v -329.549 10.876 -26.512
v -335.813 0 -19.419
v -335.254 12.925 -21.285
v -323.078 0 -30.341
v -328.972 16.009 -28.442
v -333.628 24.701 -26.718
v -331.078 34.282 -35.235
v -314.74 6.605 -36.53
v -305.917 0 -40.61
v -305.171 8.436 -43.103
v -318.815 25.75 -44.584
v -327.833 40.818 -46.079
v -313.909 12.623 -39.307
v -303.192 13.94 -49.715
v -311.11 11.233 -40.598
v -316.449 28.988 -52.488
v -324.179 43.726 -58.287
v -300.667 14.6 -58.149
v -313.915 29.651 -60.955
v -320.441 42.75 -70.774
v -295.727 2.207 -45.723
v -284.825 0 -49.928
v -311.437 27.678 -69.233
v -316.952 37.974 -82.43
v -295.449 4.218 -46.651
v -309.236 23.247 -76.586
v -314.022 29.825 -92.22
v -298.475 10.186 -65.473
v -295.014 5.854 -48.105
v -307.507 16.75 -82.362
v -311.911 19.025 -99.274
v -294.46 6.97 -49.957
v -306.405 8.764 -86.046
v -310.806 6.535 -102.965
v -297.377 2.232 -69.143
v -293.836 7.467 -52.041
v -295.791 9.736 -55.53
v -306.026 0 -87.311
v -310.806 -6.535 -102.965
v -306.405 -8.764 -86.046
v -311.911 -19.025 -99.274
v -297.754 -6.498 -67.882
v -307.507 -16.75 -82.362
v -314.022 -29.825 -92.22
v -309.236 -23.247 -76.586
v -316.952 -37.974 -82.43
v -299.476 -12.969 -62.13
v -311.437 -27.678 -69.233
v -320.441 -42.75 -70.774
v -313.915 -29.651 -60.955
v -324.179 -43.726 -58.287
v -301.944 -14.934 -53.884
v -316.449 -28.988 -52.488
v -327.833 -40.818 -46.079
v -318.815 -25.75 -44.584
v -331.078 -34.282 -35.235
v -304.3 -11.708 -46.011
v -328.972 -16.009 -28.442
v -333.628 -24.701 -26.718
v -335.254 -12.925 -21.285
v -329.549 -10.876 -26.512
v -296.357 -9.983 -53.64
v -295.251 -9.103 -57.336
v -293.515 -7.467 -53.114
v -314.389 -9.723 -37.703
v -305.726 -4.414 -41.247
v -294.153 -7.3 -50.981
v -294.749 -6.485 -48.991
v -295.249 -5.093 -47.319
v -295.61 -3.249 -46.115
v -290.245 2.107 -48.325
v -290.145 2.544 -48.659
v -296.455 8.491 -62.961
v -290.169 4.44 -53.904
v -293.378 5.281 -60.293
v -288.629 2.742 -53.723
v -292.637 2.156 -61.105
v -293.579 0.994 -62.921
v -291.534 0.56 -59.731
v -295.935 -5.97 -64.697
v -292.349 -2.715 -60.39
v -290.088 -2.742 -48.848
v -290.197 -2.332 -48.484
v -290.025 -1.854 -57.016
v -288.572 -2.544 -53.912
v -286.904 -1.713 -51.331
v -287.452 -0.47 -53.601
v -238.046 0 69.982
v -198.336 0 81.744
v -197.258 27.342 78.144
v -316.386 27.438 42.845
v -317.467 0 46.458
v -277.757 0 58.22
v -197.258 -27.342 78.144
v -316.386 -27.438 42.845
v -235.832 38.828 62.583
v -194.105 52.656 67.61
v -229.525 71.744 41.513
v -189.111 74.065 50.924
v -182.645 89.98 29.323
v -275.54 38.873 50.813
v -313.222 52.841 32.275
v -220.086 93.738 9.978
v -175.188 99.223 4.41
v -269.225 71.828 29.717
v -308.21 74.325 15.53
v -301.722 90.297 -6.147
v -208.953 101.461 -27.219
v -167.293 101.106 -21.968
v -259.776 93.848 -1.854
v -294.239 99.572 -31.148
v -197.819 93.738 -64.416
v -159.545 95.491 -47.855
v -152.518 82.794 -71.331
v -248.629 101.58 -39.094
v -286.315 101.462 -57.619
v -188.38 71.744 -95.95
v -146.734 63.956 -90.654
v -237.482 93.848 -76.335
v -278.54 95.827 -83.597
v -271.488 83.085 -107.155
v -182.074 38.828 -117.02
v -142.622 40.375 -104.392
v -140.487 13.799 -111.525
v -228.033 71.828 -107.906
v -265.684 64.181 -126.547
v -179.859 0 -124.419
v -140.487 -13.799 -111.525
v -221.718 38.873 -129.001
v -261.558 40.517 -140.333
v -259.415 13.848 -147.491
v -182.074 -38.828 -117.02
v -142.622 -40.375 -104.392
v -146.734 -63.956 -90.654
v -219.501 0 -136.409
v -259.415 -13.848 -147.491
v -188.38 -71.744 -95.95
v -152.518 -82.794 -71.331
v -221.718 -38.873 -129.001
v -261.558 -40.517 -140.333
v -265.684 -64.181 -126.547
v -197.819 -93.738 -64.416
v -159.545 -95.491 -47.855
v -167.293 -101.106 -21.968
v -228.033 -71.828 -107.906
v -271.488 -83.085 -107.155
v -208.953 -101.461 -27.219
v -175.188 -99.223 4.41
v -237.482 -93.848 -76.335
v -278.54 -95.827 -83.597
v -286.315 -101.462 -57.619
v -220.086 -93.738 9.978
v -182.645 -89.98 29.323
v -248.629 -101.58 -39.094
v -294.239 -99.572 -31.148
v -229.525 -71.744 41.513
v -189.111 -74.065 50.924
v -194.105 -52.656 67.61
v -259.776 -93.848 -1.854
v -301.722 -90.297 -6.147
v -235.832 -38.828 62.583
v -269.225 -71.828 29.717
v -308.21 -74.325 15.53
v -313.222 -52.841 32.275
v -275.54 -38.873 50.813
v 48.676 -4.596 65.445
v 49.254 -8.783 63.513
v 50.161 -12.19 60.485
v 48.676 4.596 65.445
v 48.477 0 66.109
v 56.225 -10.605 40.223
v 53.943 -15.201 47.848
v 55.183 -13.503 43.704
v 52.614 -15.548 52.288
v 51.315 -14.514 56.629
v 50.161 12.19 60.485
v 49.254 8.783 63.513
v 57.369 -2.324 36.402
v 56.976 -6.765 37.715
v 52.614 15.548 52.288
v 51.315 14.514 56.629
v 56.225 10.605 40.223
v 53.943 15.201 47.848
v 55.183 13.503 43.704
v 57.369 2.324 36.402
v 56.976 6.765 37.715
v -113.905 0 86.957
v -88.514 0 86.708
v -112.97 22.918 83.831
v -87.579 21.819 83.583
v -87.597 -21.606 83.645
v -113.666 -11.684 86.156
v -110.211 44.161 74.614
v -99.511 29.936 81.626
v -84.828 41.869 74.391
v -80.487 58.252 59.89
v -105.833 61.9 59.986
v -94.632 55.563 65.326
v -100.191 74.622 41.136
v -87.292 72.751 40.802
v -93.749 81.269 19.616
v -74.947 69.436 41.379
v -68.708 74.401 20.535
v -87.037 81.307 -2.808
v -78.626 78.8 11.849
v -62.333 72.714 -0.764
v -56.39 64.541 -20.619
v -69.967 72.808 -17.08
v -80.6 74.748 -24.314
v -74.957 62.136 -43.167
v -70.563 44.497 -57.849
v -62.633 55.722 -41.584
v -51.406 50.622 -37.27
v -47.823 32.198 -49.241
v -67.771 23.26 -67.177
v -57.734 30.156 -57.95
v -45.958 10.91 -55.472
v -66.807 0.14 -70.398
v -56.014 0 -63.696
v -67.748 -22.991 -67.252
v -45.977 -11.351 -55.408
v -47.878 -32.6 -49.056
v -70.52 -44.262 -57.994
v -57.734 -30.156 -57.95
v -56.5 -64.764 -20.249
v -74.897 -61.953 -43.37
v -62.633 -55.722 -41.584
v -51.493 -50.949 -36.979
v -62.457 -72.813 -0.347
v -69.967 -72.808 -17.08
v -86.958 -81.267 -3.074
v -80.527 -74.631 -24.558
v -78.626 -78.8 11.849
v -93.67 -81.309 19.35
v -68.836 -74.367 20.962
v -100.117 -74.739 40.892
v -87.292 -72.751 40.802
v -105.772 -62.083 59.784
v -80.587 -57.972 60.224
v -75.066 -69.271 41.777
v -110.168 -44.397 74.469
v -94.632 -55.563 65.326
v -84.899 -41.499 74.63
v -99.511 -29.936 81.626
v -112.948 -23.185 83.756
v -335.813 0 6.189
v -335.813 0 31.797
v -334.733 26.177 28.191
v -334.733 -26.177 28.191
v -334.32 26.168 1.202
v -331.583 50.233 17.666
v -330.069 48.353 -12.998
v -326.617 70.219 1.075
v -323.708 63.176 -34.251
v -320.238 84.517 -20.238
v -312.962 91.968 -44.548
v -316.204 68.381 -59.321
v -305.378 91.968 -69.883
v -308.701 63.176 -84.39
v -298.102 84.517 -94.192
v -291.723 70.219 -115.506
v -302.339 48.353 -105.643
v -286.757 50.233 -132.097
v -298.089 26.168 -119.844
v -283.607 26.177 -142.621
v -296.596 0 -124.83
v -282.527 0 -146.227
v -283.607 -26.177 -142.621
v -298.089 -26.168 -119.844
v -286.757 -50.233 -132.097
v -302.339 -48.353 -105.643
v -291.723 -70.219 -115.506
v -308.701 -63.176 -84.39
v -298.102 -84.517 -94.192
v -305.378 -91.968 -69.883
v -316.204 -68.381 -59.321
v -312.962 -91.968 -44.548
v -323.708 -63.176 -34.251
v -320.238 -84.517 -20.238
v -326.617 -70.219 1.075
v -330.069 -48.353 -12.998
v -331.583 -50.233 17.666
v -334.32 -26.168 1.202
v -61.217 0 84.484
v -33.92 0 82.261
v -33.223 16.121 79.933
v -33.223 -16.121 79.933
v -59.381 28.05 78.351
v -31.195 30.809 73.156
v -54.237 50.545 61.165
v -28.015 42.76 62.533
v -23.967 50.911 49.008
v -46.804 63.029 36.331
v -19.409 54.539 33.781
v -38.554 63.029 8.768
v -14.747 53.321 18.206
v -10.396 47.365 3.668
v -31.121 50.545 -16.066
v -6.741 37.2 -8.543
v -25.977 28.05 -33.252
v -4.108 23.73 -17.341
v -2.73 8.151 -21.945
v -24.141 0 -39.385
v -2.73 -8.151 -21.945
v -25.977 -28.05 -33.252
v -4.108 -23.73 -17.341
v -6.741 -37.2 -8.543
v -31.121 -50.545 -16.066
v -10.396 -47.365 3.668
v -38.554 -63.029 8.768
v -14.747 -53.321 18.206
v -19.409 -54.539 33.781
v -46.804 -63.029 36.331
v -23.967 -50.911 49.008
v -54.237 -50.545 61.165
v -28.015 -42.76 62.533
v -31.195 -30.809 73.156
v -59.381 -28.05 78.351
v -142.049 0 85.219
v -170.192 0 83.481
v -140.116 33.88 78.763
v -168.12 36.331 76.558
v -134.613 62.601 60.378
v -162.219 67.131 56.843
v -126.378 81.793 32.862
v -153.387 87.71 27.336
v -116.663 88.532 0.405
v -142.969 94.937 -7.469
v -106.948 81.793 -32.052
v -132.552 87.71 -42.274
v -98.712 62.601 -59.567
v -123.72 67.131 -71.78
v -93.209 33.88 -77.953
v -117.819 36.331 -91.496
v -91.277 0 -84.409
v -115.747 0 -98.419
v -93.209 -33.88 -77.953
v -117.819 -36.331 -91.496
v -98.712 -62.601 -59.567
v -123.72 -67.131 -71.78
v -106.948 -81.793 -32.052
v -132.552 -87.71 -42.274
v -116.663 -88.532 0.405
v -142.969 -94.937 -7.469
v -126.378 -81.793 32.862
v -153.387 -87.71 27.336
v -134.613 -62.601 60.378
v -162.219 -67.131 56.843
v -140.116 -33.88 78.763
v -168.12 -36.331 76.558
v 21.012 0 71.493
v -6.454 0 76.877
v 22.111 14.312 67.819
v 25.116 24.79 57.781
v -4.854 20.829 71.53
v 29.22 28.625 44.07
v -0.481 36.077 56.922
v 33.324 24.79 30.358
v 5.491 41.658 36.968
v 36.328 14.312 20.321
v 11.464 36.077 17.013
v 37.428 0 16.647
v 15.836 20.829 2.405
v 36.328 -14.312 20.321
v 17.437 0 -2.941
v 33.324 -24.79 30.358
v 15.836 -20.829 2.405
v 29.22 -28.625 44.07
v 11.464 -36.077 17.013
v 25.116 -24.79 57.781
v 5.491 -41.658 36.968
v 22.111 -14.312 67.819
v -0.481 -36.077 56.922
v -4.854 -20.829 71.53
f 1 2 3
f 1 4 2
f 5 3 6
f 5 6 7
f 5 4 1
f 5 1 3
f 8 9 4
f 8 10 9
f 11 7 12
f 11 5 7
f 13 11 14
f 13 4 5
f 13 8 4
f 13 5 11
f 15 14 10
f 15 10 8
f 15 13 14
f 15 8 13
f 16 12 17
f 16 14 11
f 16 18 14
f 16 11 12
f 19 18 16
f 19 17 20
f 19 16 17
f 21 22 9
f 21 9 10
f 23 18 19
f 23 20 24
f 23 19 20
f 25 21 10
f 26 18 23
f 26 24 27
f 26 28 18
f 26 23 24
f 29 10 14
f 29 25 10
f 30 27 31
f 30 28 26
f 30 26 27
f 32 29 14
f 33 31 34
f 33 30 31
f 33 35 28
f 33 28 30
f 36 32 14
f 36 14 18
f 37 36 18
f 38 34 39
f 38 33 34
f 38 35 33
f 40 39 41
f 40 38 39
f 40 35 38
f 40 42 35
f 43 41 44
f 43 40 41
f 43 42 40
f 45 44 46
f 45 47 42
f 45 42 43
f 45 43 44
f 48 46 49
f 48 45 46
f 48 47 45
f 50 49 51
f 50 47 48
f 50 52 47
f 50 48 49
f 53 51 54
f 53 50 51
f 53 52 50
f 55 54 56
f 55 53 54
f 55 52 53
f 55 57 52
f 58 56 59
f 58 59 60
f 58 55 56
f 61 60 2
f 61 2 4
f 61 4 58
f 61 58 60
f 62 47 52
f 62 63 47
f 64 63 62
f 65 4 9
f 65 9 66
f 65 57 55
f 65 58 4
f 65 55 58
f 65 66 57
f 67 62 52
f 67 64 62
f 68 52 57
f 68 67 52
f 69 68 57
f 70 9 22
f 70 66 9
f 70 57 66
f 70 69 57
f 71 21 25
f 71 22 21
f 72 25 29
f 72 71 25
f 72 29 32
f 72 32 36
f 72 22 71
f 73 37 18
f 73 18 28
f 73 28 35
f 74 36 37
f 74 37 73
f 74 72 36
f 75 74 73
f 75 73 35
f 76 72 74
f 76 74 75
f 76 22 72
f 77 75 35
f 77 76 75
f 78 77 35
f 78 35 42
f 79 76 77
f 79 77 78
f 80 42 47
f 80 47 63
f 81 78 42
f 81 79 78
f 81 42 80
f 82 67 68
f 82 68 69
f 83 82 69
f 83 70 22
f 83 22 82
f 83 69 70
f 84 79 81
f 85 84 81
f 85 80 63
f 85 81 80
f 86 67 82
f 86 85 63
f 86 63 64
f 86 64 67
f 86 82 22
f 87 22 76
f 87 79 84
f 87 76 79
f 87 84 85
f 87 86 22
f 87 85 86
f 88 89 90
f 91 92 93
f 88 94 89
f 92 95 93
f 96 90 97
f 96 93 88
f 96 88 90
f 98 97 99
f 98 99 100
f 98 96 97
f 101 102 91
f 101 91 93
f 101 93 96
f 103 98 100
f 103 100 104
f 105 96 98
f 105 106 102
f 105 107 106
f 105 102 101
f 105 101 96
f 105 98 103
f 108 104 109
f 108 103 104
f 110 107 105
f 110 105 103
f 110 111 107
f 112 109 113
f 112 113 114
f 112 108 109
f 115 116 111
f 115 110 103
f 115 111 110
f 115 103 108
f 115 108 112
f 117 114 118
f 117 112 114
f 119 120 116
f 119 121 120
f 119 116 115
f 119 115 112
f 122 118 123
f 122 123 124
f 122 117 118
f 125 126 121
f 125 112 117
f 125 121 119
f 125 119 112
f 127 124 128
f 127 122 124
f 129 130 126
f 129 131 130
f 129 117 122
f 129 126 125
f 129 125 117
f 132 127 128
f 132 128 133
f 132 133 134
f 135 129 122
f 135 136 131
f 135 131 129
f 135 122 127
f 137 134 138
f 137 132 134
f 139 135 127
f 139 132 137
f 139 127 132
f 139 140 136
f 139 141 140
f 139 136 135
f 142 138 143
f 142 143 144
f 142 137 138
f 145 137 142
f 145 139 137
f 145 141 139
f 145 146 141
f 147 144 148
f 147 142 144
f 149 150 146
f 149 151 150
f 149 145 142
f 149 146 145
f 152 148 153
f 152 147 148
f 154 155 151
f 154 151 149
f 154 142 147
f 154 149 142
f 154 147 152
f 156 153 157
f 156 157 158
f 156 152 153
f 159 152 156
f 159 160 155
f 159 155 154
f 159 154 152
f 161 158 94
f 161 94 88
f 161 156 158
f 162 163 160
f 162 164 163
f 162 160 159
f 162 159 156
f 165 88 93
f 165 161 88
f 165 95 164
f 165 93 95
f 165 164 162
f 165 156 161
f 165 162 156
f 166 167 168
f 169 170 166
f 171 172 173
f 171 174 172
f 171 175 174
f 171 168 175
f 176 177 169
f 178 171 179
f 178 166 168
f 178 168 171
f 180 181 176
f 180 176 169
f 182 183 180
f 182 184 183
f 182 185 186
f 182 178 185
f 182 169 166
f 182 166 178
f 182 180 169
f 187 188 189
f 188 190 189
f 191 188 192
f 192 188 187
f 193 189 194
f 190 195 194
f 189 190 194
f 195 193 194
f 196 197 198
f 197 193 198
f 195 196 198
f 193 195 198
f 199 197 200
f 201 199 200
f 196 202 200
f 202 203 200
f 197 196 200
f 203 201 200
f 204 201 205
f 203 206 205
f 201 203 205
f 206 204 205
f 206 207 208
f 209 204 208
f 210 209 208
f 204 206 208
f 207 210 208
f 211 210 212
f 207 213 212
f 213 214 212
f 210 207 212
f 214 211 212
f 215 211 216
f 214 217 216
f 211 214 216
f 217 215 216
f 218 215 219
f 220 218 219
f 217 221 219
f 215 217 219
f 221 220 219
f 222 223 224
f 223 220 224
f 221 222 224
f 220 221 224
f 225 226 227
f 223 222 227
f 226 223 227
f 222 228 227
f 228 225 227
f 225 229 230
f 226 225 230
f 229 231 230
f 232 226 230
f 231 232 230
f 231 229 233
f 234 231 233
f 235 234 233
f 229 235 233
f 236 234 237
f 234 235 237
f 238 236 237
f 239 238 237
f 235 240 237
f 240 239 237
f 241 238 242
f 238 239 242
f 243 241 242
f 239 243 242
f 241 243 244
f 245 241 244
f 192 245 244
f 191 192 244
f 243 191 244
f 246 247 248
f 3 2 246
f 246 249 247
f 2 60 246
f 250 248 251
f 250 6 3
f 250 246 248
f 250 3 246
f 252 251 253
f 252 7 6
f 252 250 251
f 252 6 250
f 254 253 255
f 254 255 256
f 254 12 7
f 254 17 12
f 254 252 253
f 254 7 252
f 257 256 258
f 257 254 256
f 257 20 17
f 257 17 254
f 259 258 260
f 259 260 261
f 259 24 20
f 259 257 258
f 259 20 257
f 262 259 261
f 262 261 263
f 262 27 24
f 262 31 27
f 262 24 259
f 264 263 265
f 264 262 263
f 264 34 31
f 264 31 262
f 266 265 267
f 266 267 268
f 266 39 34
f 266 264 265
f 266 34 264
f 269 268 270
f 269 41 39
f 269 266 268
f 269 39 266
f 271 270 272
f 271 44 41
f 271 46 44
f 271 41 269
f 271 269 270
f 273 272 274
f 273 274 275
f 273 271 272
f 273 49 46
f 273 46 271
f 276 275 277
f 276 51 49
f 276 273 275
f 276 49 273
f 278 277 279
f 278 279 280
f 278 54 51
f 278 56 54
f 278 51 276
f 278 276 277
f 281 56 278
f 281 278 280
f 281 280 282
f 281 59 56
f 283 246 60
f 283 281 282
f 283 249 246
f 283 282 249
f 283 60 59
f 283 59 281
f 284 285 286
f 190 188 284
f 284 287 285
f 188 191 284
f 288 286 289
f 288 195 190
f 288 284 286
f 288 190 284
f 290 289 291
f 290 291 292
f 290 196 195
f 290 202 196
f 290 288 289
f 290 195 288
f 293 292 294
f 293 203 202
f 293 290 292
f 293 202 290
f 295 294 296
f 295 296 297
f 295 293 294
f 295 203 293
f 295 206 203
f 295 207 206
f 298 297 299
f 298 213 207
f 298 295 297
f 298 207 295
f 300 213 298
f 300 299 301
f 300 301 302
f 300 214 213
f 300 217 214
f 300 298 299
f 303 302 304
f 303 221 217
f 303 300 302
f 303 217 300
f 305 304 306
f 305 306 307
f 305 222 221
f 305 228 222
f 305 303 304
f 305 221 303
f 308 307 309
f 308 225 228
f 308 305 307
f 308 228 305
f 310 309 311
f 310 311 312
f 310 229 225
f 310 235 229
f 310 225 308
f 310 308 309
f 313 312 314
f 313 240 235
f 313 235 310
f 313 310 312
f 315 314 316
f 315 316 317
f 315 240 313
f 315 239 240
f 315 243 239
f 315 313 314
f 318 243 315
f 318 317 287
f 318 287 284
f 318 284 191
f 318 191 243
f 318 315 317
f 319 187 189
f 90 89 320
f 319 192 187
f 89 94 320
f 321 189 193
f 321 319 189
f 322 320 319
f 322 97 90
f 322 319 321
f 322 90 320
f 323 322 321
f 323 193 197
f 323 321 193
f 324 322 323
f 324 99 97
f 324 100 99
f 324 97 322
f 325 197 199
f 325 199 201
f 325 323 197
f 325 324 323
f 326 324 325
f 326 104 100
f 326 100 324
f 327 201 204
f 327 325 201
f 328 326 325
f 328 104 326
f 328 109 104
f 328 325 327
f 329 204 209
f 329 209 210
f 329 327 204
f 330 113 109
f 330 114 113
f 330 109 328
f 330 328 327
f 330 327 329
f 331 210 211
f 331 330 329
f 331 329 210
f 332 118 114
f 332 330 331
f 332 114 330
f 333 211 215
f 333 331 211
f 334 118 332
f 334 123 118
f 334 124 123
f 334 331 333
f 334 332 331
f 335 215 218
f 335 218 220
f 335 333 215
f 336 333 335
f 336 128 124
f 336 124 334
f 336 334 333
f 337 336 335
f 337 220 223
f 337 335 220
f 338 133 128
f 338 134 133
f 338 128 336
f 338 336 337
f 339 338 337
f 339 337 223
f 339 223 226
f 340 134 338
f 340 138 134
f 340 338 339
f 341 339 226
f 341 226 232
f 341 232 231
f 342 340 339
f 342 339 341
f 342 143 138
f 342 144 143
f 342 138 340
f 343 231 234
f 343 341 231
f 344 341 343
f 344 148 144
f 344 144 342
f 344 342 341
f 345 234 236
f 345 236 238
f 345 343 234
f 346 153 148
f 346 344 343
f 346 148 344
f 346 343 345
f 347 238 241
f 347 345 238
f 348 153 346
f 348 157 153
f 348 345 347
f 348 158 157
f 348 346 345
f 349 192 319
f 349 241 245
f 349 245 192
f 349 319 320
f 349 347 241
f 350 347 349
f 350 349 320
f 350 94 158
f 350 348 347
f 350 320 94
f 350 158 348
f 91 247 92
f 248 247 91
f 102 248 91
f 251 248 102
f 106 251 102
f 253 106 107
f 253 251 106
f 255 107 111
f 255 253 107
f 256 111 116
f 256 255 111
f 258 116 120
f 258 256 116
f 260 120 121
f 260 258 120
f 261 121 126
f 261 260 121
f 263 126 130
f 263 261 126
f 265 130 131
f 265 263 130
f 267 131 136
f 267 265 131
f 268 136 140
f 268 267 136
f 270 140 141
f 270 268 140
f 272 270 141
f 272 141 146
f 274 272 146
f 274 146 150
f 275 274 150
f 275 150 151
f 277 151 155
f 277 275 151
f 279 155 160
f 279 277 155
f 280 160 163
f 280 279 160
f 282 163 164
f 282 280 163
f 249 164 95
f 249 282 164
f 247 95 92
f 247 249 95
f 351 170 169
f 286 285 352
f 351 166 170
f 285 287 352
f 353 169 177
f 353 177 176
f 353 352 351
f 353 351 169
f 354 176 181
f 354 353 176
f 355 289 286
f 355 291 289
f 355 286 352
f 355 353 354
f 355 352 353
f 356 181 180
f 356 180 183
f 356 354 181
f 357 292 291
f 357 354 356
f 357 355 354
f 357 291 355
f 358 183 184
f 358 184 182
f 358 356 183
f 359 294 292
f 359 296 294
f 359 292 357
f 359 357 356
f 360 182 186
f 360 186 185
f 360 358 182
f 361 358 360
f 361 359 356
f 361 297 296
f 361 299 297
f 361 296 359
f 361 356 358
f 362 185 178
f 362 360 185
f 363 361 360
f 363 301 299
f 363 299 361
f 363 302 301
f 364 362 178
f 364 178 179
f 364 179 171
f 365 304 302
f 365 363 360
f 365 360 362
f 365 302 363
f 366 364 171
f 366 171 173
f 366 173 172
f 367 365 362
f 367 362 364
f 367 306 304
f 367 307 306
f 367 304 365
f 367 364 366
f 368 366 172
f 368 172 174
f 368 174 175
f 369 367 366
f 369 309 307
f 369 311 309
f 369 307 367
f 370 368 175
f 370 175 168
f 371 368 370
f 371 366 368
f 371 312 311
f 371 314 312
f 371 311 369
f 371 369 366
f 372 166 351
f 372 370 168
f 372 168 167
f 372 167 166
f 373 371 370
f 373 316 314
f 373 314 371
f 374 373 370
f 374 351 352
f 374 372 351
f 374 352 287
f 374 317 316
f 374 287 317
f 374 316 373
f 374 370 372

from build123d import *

# Parameters (mm, degrees)
F2_R = 177.8


with BuildPart() as f1:
    # F0 (on Front) → F1 (revolve)
    with BuildSketch(Plane.XZ):
        with BuildLine():
            Line((-335.8125113323, 31.7965768238), (-335.8125113323, -19.4187790523))
            add(Edge.make_bspline(
                [(-335.8125113323, -19.4187790523), (-319.8361711455, -36.4996415061), (-284.8251686885, -49.9284887464)],
                knots=[0.306906154, 0.306906154, 0.306906154, 0.7235563013, 0.7235563013, 0.7235563013], degree=2, weights=[1, 0.9783786977, 1]))
            Line((-284.8251686885, -49.9284887464), (52.9480699434, 51.1722083456))
            Line((52.9480699434, 51.1722083456), (48.4772927708, 66.1088895775))
            Line((48.4772927708, 66.1088895775), (-33.9198673979, 82.2606457376))
            Line((-33.9198673979, 82.2606457376), (-101.2008483359, 87.7409892803))
            Line((-101.2008483359, 87.7409892803), (-198.3356029312, 81.7438942248))
            Line((-198.3356029312, 81.7438942248), (-317.4673501972, 46.4583143785))
            add(Edge.make_bspline(
                [(-317.4673501972, 46.4583143785), (-328.6813986252, 39.4206981099), (-335.8125113323, 31.7965768238)],
                knots=[5.7881245931, 5.7881245931, 5.7881245931, 5.9762791532, 5.9762791532, 5.9762791532], degree=2, weights=[1, 0.9955779956, 1]))
        make_face()
    revolve(axis=Axis((-97.3393025247, 0, 6.1888988857), (-0.958006633, 0, -0.2867460395)))

    # F2
    f2_edges = [f1.edges().sort_by_distance(p)[0] for p in [
        (-55.76036, 0, -64.073798),
    ]]
    fillet(f2_edges, radius=F2_R)


solid = f1.part
